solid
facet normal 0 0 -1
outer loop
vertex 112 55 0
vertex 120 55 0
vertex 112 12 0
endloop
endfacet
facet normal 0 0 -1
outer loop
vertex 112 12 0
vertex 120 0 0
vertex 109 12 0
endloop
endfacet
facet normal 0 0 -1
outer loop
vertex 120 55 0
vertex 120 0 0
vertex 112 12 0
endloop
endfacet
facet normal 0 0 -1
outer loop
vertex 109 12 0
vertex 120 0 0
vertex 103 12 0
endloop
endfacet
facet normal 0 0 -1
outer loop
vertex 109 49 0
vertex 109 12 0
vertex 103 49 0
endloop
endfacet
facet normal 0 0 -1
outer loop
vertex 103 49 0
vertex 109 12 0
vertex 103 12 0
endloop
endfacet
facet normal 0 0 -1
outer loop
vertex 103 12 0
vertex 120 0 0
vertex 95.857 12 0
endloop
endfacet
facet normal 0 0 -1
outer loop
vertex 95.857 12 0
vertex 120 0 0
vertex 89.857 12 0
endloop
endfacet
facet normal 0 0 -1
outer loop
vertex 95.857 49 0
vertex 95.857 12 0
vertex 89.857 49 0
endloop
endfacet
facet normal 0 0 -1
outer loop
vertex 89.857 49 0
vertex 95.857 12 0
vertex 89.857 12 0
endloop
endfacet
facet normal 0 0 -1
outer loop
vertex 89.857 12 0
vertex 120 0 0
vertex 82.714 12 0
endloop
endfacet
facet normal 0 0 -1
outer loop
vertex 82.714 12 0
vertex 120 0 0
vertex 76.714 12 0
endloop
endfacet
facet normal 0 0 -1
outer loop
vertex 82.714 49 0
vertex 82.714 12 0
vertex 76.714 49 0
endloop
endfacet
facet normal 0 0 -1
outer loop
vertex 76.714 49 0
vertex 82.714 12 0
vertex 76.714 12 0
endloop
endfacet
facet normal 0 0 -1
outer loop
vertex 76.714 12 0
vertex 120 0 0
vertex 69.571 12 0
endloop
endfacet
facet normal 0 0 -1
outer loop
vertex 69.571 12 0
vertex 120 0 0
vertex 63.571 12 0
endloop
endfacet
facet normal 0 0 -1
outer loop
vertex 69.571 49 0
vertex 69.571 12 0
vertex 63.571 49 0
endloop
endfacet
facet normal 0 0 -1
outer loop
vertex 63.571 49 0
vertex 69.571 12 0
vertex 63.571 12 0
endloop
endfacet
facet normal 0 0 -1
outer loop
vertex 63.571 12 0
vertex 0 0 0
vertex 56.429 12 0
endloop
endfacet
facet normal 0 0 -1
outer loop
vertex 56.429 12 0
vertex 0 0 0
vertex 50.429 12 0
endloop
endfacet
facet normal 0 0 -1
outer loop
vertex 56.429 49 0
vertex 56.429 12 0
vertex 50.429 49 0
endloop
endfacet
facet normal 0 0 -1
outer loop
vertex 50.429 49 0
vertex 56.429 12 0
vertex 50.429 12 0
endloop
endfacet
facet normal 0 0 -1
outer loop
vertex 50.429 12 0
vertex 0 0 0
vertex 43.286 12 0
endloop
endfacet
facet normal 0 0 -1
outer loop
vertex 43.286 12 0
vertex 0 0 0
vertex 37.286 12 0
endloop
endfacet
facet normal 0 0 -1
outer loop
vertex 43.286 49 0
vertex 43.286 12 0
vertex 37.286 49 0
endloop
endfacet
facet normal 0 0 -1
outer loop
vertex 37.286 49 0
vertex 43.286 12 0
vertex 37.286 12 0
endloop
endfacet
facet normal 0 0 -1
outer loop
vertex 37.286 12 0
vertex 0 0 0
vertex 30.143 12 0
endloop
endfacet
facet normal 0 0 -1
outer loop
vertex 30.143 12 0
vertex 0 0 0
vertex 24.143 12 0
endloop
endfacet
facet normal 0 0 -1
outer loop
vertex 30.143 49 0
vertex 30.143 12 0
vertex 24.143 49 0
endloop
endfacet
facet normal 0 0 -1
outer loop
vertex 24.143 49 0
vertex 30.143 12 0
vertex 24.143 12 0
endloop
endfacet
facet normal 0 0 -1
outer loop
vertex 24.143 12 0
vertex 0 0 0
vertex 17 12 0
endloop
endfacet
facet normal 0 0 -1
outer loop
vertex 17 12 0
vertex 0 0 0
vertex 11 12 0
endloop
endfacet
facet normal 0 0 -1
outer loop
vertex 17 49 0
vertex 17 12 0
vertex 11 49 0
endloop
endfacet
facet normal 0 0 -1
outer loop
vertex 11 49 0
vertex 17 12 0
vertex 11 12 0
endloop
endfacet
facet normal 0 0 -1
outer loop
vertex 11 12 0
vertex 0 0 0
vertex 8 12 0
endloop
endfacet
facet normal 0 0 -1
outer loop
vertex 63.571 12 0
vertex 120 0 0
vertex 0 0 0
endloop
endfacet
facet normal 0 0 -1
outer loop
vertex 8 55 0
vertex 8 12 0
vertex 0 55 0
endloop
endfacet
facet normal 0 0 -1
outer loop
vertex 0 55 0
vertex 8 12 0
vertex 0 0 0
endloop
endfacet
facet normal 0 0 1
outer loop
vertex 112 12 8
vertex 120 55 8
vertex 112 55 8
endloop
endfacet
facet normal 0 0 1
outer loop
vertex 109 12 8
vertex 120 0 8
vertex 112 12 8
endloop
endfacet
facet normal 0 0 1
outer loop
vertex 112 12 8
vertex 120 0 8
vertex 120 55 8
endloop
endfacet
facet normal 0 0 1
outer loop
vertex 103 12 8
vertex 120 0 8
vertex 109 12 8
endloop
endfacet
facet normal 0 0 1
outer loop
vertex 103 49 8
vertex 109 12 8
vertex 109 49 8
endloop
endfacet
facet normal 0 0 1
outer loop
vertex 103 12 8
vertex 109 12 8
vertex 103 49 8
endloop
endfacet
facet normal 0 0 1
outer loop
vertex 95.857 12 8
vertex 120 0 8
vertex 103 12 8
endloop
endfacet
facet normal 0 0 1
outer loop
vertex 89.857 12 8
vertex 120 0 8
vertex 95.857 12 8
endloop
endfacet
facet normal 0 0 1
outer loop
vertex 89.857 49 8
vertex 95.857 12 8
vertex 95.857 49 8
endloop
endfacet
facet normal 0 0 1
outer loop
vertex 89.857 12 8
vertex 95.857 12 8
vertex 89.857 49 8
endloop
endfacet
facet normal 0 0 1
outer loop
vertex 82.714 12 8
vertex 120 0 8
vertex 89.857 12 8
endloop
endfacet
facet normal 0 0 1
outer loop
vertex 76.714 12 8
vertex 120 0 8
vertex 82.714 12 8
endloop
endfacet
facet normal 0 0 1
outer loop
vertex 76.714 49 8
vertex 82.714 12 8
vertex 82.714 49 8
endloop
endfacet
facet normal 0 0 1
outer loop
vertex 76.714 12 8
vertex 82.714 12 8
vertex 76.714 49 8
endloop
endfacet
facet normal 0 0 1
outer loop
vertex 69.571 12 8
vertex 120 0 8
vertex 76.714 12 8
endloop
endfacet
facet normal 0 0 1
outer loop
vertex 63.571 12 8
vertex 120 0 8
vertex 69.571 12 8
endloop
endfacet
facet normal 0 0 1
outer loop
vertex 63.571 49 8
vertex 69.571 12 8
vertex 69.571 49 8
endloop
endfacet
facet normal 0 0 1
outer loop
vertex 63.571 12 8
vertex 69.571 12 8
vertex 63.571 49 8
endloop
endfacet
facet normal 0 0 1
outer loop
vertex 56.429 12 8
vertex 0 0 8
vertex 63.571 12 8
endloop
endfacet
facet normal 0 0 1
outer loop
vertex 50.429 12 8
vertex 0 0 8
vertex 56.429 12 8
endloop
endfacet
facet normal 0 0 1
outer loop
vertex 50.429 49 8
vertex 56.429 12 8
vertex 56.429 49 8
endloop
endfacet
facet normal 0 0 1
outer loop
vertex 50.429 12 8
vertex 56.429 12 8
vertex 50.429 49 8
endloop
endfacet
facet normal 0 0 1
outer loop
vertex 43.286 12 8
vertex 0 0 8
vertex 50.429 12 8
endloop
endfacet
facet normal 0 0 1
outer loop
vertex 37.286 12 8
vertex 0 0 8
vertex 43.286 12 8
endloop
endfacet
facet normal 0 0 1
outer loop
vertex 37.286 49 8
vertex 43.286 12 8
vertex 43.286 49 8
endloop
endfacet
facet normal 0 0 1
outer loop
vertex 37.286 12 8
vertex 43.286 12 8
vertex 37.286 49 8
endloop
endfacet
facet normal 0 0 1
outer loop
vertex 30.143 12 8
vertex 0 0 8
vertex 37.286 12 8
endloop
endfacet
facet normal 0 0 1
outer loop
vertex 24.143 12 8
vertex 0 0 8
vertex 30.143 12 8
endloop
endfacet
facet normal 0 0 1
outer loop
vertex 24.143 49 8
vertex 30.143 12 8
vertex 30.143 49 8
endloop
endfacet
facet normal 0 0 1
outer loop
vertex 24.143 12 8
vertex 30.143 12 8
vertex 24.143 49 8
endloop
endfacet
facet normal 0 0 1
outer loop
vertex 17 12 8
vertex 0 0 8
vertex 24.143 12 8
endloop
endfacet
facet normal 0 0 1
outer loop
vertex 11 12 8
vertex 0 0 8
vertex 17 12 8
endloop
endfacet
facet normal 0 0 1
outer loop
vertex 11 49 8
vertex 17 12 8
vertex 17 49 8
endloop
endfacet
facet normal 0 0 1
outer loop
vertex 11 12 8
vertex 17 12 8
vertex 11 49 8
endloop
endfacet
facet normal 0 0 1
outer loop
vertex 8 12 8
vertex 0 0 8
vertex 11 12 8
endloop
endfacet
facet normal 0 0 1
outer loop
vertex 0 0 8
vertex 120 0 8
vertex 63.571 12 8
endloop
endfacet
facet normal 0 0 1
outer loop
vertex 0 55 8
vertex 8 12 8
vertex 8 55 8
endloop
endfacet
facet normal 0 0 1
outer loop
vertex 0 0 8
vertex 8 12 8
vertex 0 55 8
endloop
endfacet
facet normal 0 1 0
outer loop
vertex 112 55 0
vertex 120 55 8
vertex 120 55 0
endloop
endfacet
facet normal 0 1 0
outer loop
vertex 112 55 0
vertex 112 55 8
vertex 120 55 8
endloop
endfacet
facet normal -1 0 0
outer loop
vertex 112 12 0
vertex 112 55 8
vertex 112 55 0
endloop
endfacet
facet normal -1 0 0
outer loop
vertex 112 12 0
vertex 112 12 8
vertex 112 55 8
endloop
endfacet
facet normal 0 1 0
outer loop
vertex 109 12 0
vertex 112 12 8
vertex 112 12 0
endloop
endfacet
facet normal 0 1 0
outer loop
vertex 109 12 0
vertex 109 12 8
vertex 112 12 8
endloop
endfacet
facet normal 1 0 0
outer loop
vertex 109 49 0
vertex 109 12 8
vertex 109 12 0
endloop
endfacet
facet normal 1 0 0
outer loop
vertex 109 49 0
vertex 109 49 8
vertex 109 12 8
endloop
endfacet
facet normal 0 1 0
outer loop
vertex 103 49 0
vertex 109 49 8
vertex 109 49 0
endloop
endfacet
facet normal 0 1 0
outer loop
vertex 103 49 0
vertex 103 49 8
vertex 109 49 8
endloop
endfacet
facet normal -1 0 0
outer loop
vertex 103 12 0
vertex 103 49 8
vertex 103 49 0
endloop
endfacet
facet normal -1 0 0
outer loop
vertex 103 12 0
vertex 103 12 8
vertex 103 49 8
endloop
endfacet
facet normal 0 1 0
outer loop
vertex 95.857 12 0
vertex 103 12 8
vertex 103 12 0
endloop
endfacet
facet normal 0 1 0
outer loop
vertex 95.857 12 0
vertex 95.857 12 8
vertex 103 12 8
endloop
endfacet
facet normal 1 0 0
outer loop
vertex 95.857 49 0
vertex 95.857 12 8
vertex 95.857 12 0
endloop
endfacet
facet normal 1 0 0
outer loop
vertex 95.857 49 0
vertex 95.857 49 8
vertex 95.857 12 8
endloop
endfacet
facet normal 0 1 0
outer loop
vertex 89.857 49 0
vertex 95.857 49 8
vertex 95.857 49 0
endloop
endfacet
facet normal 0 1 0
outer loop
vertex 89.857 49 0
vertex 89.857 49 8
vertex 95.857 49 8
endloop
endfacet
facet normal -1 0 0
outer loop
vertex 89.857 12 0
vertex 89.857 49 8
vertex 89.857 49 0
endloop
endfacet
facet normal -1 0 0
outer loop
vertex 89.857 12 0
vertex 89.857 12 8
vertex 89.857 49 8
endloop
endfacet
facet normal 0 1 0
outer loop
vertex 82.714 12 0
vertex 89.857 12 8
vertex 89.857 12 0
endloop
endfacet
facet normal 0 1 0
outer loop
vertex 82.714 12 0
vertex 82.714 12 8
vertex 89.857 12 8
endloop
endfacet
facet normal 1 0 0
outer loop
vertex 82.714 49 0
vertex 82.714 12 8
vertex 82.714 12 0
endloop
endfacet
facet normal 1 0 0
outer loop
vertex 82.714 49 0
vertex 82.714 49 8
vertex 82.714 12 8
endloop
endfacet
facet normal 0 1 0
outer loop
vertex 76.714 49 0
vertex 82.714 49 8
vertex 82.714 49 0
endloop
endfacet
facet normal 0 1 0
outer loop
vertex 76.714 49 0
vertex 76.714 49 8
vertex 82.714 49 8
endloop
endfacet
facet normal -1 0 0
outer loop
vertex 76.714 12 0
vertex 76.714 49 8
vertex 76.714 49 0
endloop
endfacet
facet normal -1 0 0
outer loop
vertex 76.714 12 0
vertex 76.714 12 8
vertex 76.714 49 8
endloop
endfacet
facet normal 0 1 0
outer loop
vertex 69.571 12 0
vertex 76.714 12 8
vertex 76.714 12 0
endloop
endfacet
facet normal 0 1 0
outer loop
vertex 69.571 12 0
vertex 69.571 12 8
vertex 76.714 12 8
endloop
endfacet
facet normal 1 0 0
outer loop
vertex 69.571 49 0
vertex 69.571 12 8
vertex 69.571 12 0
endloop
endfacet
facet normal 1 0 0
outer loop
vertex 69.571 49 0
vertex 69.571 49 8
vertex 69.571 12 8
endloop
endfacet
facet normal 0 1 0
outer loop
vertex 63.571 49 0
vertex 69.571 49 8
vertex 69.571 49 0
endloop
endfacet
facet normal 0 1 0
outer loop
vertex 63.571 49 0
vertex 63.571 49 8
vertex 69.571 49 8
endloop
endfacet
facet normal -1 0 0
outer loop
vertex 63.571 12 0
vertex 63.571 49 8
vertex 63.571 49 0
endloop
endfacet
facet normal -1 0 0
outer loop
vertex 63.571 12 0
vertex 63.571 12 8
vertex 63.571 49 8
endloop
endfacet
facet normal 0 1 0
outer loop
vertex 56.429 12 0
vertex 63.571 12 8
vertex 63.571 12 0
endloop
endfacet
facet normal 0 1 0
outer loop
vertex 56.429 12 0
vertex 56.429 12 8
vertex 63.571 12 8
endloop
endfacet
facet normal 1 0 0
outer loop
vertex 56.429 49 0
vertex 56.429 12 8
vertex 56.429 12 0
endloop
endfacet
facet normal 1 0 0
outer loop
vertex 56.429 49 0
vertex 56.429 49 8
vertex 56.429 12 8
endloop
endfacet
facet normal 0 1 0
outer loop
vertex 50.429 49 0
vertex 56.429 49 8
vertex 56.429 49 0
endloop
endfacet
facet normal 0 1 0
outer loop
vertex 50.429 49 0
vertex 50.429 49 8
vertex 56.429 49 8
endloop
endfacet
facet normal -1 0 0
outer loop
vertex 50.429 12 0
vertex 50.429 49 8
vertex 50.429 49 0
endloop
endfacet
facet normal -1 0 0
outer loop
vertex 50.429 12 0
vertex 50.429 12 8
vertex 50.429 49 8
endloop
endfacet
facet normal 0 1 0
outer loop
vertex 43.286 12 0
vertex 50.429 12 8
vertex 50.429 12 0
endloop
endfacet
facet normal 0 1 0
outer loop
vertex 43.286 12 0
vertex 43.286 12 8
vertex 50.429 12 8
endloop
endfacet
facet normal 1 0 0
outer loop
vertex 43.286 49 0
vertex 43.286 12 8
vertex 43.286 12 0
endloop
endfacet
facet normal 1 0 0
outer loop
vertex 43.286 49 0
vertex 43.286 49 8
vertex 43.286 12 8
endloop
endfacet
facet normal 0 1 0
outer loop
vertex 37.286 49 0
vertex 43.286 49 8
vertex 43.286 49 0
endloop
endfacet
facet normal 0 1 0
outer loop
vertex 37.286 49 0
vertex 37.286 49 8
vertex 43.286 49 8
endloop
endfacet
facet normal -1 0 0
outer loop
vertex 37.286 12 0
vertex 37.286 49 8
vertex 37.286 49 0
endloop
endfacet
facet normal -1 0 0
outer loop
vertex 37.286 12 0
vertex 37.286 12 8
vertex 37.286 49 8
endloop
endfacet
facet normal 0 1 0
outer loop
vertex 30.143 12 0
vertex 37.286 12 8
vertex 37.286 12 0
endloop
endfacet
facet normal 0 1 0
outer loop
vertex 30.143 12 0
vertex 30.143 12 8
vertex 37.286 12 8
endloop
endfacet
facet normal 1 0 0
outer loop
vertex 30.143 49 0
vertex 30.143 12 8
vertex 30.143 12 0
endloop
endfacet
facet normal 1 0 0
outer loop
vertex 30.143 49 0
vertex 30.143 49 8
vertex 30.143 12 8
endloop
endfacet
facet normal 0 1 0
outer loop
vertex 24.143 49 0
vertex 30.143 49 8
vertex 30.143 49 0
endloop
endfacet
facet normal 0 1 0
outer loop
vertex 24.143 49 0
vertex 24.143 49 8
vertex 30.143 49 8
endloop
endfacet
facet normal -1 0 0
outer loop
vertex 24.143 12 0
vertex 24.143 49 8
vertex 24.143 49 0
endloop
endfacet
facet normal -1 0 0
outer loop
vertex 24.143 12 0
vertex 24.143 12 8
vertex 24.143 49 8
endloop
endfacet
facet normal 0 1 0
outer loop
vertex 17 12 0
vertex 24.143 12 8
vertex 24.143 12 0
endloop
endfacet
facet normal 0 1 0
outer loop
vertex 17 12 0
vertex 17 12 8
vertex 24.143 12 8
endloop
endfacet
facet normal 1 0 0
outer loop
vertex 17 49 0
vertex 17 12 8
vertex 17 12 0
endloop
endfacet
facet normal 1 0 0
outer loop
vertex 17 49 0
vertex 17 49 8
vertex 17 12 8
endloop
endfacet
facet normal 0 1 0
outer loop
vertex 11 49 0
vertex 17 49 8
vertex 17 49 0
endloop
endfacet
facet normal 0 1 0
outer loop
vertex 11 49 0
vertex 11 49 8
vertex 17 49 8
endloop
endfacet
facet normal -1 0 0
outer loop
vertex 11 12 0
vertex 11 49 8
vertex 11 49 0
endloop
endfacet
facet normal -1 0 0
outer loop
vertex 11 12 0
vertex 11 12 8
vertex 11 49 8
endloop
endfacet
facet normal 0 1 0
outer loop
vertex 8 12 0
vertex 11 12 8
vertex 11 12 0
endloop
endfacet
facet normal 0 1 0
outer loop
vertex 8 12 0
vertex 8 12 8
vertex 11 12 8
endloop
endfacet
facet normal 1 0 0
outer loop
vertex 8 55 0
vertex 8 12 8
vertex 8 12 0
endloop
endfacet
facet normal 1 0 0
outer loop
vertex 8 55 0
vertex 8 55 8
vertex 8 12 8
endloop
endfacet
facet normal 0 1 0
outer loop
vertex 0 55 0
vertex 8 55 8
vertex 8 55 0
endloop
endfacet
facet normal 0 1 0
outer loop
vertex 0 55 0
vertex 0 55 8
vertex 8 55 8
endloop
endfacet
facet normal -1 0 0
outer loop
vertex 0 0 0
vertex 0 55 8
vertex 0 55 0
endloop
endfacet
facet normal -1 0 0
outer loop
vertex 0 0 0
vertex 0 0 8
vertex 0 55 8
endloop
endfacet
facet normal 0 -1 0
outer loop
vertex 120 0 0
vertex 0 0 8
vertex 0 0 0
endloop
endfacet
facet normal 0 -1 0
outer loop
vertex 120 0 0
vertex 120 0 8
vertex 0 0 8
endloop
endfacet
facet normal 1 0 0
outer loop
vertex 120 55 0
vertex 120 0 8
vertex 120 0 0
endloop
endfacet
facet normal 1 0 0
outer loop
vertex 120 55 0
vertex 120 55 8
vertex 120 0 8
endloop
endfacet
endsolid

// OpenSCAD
$fn = 32;

// ----------------------------------------------------------------------
// Guard grille: 8 slats over a 120 x 55 mm plate
// ----------------------------------------------------------------------

// --- parameters (mm) ---
profile_height = 8;       // extrusion height
profile_points = 40;      // points of the closed outline

profile = [[0, 0], [120, 0], [120, 55], [112, 55], [112, 12], [109, 12], [109, 49], [103, 49], [103, 12], [95.857, 12], [95.857, 49], [89.857, 49], [89.857, 12], [82.714, 12], [82.714, 49], [76.714, 49], [76.714, 12], [69.571, 12], [69.571, 49], [63.571, 49], [63.571, 12], [56.429, 12], [56.429, 49], [50.429, 49], [50.429, 12], [43.286, 12], [43.286, 49], [37.286, 49], [37.286, 12], [30.143, 12], [30.143, 49], [24.143, 49], [24.143, 12], [17, 12], [17, 49], [11, 49], [11, 12], [8, 12], [8, 55], [0, 55]];  // single closed polygon, 40 points, counter clockwise

// --- the one profile operation ---
linear_extrude(height = profile_height) polygon(points = profile);
